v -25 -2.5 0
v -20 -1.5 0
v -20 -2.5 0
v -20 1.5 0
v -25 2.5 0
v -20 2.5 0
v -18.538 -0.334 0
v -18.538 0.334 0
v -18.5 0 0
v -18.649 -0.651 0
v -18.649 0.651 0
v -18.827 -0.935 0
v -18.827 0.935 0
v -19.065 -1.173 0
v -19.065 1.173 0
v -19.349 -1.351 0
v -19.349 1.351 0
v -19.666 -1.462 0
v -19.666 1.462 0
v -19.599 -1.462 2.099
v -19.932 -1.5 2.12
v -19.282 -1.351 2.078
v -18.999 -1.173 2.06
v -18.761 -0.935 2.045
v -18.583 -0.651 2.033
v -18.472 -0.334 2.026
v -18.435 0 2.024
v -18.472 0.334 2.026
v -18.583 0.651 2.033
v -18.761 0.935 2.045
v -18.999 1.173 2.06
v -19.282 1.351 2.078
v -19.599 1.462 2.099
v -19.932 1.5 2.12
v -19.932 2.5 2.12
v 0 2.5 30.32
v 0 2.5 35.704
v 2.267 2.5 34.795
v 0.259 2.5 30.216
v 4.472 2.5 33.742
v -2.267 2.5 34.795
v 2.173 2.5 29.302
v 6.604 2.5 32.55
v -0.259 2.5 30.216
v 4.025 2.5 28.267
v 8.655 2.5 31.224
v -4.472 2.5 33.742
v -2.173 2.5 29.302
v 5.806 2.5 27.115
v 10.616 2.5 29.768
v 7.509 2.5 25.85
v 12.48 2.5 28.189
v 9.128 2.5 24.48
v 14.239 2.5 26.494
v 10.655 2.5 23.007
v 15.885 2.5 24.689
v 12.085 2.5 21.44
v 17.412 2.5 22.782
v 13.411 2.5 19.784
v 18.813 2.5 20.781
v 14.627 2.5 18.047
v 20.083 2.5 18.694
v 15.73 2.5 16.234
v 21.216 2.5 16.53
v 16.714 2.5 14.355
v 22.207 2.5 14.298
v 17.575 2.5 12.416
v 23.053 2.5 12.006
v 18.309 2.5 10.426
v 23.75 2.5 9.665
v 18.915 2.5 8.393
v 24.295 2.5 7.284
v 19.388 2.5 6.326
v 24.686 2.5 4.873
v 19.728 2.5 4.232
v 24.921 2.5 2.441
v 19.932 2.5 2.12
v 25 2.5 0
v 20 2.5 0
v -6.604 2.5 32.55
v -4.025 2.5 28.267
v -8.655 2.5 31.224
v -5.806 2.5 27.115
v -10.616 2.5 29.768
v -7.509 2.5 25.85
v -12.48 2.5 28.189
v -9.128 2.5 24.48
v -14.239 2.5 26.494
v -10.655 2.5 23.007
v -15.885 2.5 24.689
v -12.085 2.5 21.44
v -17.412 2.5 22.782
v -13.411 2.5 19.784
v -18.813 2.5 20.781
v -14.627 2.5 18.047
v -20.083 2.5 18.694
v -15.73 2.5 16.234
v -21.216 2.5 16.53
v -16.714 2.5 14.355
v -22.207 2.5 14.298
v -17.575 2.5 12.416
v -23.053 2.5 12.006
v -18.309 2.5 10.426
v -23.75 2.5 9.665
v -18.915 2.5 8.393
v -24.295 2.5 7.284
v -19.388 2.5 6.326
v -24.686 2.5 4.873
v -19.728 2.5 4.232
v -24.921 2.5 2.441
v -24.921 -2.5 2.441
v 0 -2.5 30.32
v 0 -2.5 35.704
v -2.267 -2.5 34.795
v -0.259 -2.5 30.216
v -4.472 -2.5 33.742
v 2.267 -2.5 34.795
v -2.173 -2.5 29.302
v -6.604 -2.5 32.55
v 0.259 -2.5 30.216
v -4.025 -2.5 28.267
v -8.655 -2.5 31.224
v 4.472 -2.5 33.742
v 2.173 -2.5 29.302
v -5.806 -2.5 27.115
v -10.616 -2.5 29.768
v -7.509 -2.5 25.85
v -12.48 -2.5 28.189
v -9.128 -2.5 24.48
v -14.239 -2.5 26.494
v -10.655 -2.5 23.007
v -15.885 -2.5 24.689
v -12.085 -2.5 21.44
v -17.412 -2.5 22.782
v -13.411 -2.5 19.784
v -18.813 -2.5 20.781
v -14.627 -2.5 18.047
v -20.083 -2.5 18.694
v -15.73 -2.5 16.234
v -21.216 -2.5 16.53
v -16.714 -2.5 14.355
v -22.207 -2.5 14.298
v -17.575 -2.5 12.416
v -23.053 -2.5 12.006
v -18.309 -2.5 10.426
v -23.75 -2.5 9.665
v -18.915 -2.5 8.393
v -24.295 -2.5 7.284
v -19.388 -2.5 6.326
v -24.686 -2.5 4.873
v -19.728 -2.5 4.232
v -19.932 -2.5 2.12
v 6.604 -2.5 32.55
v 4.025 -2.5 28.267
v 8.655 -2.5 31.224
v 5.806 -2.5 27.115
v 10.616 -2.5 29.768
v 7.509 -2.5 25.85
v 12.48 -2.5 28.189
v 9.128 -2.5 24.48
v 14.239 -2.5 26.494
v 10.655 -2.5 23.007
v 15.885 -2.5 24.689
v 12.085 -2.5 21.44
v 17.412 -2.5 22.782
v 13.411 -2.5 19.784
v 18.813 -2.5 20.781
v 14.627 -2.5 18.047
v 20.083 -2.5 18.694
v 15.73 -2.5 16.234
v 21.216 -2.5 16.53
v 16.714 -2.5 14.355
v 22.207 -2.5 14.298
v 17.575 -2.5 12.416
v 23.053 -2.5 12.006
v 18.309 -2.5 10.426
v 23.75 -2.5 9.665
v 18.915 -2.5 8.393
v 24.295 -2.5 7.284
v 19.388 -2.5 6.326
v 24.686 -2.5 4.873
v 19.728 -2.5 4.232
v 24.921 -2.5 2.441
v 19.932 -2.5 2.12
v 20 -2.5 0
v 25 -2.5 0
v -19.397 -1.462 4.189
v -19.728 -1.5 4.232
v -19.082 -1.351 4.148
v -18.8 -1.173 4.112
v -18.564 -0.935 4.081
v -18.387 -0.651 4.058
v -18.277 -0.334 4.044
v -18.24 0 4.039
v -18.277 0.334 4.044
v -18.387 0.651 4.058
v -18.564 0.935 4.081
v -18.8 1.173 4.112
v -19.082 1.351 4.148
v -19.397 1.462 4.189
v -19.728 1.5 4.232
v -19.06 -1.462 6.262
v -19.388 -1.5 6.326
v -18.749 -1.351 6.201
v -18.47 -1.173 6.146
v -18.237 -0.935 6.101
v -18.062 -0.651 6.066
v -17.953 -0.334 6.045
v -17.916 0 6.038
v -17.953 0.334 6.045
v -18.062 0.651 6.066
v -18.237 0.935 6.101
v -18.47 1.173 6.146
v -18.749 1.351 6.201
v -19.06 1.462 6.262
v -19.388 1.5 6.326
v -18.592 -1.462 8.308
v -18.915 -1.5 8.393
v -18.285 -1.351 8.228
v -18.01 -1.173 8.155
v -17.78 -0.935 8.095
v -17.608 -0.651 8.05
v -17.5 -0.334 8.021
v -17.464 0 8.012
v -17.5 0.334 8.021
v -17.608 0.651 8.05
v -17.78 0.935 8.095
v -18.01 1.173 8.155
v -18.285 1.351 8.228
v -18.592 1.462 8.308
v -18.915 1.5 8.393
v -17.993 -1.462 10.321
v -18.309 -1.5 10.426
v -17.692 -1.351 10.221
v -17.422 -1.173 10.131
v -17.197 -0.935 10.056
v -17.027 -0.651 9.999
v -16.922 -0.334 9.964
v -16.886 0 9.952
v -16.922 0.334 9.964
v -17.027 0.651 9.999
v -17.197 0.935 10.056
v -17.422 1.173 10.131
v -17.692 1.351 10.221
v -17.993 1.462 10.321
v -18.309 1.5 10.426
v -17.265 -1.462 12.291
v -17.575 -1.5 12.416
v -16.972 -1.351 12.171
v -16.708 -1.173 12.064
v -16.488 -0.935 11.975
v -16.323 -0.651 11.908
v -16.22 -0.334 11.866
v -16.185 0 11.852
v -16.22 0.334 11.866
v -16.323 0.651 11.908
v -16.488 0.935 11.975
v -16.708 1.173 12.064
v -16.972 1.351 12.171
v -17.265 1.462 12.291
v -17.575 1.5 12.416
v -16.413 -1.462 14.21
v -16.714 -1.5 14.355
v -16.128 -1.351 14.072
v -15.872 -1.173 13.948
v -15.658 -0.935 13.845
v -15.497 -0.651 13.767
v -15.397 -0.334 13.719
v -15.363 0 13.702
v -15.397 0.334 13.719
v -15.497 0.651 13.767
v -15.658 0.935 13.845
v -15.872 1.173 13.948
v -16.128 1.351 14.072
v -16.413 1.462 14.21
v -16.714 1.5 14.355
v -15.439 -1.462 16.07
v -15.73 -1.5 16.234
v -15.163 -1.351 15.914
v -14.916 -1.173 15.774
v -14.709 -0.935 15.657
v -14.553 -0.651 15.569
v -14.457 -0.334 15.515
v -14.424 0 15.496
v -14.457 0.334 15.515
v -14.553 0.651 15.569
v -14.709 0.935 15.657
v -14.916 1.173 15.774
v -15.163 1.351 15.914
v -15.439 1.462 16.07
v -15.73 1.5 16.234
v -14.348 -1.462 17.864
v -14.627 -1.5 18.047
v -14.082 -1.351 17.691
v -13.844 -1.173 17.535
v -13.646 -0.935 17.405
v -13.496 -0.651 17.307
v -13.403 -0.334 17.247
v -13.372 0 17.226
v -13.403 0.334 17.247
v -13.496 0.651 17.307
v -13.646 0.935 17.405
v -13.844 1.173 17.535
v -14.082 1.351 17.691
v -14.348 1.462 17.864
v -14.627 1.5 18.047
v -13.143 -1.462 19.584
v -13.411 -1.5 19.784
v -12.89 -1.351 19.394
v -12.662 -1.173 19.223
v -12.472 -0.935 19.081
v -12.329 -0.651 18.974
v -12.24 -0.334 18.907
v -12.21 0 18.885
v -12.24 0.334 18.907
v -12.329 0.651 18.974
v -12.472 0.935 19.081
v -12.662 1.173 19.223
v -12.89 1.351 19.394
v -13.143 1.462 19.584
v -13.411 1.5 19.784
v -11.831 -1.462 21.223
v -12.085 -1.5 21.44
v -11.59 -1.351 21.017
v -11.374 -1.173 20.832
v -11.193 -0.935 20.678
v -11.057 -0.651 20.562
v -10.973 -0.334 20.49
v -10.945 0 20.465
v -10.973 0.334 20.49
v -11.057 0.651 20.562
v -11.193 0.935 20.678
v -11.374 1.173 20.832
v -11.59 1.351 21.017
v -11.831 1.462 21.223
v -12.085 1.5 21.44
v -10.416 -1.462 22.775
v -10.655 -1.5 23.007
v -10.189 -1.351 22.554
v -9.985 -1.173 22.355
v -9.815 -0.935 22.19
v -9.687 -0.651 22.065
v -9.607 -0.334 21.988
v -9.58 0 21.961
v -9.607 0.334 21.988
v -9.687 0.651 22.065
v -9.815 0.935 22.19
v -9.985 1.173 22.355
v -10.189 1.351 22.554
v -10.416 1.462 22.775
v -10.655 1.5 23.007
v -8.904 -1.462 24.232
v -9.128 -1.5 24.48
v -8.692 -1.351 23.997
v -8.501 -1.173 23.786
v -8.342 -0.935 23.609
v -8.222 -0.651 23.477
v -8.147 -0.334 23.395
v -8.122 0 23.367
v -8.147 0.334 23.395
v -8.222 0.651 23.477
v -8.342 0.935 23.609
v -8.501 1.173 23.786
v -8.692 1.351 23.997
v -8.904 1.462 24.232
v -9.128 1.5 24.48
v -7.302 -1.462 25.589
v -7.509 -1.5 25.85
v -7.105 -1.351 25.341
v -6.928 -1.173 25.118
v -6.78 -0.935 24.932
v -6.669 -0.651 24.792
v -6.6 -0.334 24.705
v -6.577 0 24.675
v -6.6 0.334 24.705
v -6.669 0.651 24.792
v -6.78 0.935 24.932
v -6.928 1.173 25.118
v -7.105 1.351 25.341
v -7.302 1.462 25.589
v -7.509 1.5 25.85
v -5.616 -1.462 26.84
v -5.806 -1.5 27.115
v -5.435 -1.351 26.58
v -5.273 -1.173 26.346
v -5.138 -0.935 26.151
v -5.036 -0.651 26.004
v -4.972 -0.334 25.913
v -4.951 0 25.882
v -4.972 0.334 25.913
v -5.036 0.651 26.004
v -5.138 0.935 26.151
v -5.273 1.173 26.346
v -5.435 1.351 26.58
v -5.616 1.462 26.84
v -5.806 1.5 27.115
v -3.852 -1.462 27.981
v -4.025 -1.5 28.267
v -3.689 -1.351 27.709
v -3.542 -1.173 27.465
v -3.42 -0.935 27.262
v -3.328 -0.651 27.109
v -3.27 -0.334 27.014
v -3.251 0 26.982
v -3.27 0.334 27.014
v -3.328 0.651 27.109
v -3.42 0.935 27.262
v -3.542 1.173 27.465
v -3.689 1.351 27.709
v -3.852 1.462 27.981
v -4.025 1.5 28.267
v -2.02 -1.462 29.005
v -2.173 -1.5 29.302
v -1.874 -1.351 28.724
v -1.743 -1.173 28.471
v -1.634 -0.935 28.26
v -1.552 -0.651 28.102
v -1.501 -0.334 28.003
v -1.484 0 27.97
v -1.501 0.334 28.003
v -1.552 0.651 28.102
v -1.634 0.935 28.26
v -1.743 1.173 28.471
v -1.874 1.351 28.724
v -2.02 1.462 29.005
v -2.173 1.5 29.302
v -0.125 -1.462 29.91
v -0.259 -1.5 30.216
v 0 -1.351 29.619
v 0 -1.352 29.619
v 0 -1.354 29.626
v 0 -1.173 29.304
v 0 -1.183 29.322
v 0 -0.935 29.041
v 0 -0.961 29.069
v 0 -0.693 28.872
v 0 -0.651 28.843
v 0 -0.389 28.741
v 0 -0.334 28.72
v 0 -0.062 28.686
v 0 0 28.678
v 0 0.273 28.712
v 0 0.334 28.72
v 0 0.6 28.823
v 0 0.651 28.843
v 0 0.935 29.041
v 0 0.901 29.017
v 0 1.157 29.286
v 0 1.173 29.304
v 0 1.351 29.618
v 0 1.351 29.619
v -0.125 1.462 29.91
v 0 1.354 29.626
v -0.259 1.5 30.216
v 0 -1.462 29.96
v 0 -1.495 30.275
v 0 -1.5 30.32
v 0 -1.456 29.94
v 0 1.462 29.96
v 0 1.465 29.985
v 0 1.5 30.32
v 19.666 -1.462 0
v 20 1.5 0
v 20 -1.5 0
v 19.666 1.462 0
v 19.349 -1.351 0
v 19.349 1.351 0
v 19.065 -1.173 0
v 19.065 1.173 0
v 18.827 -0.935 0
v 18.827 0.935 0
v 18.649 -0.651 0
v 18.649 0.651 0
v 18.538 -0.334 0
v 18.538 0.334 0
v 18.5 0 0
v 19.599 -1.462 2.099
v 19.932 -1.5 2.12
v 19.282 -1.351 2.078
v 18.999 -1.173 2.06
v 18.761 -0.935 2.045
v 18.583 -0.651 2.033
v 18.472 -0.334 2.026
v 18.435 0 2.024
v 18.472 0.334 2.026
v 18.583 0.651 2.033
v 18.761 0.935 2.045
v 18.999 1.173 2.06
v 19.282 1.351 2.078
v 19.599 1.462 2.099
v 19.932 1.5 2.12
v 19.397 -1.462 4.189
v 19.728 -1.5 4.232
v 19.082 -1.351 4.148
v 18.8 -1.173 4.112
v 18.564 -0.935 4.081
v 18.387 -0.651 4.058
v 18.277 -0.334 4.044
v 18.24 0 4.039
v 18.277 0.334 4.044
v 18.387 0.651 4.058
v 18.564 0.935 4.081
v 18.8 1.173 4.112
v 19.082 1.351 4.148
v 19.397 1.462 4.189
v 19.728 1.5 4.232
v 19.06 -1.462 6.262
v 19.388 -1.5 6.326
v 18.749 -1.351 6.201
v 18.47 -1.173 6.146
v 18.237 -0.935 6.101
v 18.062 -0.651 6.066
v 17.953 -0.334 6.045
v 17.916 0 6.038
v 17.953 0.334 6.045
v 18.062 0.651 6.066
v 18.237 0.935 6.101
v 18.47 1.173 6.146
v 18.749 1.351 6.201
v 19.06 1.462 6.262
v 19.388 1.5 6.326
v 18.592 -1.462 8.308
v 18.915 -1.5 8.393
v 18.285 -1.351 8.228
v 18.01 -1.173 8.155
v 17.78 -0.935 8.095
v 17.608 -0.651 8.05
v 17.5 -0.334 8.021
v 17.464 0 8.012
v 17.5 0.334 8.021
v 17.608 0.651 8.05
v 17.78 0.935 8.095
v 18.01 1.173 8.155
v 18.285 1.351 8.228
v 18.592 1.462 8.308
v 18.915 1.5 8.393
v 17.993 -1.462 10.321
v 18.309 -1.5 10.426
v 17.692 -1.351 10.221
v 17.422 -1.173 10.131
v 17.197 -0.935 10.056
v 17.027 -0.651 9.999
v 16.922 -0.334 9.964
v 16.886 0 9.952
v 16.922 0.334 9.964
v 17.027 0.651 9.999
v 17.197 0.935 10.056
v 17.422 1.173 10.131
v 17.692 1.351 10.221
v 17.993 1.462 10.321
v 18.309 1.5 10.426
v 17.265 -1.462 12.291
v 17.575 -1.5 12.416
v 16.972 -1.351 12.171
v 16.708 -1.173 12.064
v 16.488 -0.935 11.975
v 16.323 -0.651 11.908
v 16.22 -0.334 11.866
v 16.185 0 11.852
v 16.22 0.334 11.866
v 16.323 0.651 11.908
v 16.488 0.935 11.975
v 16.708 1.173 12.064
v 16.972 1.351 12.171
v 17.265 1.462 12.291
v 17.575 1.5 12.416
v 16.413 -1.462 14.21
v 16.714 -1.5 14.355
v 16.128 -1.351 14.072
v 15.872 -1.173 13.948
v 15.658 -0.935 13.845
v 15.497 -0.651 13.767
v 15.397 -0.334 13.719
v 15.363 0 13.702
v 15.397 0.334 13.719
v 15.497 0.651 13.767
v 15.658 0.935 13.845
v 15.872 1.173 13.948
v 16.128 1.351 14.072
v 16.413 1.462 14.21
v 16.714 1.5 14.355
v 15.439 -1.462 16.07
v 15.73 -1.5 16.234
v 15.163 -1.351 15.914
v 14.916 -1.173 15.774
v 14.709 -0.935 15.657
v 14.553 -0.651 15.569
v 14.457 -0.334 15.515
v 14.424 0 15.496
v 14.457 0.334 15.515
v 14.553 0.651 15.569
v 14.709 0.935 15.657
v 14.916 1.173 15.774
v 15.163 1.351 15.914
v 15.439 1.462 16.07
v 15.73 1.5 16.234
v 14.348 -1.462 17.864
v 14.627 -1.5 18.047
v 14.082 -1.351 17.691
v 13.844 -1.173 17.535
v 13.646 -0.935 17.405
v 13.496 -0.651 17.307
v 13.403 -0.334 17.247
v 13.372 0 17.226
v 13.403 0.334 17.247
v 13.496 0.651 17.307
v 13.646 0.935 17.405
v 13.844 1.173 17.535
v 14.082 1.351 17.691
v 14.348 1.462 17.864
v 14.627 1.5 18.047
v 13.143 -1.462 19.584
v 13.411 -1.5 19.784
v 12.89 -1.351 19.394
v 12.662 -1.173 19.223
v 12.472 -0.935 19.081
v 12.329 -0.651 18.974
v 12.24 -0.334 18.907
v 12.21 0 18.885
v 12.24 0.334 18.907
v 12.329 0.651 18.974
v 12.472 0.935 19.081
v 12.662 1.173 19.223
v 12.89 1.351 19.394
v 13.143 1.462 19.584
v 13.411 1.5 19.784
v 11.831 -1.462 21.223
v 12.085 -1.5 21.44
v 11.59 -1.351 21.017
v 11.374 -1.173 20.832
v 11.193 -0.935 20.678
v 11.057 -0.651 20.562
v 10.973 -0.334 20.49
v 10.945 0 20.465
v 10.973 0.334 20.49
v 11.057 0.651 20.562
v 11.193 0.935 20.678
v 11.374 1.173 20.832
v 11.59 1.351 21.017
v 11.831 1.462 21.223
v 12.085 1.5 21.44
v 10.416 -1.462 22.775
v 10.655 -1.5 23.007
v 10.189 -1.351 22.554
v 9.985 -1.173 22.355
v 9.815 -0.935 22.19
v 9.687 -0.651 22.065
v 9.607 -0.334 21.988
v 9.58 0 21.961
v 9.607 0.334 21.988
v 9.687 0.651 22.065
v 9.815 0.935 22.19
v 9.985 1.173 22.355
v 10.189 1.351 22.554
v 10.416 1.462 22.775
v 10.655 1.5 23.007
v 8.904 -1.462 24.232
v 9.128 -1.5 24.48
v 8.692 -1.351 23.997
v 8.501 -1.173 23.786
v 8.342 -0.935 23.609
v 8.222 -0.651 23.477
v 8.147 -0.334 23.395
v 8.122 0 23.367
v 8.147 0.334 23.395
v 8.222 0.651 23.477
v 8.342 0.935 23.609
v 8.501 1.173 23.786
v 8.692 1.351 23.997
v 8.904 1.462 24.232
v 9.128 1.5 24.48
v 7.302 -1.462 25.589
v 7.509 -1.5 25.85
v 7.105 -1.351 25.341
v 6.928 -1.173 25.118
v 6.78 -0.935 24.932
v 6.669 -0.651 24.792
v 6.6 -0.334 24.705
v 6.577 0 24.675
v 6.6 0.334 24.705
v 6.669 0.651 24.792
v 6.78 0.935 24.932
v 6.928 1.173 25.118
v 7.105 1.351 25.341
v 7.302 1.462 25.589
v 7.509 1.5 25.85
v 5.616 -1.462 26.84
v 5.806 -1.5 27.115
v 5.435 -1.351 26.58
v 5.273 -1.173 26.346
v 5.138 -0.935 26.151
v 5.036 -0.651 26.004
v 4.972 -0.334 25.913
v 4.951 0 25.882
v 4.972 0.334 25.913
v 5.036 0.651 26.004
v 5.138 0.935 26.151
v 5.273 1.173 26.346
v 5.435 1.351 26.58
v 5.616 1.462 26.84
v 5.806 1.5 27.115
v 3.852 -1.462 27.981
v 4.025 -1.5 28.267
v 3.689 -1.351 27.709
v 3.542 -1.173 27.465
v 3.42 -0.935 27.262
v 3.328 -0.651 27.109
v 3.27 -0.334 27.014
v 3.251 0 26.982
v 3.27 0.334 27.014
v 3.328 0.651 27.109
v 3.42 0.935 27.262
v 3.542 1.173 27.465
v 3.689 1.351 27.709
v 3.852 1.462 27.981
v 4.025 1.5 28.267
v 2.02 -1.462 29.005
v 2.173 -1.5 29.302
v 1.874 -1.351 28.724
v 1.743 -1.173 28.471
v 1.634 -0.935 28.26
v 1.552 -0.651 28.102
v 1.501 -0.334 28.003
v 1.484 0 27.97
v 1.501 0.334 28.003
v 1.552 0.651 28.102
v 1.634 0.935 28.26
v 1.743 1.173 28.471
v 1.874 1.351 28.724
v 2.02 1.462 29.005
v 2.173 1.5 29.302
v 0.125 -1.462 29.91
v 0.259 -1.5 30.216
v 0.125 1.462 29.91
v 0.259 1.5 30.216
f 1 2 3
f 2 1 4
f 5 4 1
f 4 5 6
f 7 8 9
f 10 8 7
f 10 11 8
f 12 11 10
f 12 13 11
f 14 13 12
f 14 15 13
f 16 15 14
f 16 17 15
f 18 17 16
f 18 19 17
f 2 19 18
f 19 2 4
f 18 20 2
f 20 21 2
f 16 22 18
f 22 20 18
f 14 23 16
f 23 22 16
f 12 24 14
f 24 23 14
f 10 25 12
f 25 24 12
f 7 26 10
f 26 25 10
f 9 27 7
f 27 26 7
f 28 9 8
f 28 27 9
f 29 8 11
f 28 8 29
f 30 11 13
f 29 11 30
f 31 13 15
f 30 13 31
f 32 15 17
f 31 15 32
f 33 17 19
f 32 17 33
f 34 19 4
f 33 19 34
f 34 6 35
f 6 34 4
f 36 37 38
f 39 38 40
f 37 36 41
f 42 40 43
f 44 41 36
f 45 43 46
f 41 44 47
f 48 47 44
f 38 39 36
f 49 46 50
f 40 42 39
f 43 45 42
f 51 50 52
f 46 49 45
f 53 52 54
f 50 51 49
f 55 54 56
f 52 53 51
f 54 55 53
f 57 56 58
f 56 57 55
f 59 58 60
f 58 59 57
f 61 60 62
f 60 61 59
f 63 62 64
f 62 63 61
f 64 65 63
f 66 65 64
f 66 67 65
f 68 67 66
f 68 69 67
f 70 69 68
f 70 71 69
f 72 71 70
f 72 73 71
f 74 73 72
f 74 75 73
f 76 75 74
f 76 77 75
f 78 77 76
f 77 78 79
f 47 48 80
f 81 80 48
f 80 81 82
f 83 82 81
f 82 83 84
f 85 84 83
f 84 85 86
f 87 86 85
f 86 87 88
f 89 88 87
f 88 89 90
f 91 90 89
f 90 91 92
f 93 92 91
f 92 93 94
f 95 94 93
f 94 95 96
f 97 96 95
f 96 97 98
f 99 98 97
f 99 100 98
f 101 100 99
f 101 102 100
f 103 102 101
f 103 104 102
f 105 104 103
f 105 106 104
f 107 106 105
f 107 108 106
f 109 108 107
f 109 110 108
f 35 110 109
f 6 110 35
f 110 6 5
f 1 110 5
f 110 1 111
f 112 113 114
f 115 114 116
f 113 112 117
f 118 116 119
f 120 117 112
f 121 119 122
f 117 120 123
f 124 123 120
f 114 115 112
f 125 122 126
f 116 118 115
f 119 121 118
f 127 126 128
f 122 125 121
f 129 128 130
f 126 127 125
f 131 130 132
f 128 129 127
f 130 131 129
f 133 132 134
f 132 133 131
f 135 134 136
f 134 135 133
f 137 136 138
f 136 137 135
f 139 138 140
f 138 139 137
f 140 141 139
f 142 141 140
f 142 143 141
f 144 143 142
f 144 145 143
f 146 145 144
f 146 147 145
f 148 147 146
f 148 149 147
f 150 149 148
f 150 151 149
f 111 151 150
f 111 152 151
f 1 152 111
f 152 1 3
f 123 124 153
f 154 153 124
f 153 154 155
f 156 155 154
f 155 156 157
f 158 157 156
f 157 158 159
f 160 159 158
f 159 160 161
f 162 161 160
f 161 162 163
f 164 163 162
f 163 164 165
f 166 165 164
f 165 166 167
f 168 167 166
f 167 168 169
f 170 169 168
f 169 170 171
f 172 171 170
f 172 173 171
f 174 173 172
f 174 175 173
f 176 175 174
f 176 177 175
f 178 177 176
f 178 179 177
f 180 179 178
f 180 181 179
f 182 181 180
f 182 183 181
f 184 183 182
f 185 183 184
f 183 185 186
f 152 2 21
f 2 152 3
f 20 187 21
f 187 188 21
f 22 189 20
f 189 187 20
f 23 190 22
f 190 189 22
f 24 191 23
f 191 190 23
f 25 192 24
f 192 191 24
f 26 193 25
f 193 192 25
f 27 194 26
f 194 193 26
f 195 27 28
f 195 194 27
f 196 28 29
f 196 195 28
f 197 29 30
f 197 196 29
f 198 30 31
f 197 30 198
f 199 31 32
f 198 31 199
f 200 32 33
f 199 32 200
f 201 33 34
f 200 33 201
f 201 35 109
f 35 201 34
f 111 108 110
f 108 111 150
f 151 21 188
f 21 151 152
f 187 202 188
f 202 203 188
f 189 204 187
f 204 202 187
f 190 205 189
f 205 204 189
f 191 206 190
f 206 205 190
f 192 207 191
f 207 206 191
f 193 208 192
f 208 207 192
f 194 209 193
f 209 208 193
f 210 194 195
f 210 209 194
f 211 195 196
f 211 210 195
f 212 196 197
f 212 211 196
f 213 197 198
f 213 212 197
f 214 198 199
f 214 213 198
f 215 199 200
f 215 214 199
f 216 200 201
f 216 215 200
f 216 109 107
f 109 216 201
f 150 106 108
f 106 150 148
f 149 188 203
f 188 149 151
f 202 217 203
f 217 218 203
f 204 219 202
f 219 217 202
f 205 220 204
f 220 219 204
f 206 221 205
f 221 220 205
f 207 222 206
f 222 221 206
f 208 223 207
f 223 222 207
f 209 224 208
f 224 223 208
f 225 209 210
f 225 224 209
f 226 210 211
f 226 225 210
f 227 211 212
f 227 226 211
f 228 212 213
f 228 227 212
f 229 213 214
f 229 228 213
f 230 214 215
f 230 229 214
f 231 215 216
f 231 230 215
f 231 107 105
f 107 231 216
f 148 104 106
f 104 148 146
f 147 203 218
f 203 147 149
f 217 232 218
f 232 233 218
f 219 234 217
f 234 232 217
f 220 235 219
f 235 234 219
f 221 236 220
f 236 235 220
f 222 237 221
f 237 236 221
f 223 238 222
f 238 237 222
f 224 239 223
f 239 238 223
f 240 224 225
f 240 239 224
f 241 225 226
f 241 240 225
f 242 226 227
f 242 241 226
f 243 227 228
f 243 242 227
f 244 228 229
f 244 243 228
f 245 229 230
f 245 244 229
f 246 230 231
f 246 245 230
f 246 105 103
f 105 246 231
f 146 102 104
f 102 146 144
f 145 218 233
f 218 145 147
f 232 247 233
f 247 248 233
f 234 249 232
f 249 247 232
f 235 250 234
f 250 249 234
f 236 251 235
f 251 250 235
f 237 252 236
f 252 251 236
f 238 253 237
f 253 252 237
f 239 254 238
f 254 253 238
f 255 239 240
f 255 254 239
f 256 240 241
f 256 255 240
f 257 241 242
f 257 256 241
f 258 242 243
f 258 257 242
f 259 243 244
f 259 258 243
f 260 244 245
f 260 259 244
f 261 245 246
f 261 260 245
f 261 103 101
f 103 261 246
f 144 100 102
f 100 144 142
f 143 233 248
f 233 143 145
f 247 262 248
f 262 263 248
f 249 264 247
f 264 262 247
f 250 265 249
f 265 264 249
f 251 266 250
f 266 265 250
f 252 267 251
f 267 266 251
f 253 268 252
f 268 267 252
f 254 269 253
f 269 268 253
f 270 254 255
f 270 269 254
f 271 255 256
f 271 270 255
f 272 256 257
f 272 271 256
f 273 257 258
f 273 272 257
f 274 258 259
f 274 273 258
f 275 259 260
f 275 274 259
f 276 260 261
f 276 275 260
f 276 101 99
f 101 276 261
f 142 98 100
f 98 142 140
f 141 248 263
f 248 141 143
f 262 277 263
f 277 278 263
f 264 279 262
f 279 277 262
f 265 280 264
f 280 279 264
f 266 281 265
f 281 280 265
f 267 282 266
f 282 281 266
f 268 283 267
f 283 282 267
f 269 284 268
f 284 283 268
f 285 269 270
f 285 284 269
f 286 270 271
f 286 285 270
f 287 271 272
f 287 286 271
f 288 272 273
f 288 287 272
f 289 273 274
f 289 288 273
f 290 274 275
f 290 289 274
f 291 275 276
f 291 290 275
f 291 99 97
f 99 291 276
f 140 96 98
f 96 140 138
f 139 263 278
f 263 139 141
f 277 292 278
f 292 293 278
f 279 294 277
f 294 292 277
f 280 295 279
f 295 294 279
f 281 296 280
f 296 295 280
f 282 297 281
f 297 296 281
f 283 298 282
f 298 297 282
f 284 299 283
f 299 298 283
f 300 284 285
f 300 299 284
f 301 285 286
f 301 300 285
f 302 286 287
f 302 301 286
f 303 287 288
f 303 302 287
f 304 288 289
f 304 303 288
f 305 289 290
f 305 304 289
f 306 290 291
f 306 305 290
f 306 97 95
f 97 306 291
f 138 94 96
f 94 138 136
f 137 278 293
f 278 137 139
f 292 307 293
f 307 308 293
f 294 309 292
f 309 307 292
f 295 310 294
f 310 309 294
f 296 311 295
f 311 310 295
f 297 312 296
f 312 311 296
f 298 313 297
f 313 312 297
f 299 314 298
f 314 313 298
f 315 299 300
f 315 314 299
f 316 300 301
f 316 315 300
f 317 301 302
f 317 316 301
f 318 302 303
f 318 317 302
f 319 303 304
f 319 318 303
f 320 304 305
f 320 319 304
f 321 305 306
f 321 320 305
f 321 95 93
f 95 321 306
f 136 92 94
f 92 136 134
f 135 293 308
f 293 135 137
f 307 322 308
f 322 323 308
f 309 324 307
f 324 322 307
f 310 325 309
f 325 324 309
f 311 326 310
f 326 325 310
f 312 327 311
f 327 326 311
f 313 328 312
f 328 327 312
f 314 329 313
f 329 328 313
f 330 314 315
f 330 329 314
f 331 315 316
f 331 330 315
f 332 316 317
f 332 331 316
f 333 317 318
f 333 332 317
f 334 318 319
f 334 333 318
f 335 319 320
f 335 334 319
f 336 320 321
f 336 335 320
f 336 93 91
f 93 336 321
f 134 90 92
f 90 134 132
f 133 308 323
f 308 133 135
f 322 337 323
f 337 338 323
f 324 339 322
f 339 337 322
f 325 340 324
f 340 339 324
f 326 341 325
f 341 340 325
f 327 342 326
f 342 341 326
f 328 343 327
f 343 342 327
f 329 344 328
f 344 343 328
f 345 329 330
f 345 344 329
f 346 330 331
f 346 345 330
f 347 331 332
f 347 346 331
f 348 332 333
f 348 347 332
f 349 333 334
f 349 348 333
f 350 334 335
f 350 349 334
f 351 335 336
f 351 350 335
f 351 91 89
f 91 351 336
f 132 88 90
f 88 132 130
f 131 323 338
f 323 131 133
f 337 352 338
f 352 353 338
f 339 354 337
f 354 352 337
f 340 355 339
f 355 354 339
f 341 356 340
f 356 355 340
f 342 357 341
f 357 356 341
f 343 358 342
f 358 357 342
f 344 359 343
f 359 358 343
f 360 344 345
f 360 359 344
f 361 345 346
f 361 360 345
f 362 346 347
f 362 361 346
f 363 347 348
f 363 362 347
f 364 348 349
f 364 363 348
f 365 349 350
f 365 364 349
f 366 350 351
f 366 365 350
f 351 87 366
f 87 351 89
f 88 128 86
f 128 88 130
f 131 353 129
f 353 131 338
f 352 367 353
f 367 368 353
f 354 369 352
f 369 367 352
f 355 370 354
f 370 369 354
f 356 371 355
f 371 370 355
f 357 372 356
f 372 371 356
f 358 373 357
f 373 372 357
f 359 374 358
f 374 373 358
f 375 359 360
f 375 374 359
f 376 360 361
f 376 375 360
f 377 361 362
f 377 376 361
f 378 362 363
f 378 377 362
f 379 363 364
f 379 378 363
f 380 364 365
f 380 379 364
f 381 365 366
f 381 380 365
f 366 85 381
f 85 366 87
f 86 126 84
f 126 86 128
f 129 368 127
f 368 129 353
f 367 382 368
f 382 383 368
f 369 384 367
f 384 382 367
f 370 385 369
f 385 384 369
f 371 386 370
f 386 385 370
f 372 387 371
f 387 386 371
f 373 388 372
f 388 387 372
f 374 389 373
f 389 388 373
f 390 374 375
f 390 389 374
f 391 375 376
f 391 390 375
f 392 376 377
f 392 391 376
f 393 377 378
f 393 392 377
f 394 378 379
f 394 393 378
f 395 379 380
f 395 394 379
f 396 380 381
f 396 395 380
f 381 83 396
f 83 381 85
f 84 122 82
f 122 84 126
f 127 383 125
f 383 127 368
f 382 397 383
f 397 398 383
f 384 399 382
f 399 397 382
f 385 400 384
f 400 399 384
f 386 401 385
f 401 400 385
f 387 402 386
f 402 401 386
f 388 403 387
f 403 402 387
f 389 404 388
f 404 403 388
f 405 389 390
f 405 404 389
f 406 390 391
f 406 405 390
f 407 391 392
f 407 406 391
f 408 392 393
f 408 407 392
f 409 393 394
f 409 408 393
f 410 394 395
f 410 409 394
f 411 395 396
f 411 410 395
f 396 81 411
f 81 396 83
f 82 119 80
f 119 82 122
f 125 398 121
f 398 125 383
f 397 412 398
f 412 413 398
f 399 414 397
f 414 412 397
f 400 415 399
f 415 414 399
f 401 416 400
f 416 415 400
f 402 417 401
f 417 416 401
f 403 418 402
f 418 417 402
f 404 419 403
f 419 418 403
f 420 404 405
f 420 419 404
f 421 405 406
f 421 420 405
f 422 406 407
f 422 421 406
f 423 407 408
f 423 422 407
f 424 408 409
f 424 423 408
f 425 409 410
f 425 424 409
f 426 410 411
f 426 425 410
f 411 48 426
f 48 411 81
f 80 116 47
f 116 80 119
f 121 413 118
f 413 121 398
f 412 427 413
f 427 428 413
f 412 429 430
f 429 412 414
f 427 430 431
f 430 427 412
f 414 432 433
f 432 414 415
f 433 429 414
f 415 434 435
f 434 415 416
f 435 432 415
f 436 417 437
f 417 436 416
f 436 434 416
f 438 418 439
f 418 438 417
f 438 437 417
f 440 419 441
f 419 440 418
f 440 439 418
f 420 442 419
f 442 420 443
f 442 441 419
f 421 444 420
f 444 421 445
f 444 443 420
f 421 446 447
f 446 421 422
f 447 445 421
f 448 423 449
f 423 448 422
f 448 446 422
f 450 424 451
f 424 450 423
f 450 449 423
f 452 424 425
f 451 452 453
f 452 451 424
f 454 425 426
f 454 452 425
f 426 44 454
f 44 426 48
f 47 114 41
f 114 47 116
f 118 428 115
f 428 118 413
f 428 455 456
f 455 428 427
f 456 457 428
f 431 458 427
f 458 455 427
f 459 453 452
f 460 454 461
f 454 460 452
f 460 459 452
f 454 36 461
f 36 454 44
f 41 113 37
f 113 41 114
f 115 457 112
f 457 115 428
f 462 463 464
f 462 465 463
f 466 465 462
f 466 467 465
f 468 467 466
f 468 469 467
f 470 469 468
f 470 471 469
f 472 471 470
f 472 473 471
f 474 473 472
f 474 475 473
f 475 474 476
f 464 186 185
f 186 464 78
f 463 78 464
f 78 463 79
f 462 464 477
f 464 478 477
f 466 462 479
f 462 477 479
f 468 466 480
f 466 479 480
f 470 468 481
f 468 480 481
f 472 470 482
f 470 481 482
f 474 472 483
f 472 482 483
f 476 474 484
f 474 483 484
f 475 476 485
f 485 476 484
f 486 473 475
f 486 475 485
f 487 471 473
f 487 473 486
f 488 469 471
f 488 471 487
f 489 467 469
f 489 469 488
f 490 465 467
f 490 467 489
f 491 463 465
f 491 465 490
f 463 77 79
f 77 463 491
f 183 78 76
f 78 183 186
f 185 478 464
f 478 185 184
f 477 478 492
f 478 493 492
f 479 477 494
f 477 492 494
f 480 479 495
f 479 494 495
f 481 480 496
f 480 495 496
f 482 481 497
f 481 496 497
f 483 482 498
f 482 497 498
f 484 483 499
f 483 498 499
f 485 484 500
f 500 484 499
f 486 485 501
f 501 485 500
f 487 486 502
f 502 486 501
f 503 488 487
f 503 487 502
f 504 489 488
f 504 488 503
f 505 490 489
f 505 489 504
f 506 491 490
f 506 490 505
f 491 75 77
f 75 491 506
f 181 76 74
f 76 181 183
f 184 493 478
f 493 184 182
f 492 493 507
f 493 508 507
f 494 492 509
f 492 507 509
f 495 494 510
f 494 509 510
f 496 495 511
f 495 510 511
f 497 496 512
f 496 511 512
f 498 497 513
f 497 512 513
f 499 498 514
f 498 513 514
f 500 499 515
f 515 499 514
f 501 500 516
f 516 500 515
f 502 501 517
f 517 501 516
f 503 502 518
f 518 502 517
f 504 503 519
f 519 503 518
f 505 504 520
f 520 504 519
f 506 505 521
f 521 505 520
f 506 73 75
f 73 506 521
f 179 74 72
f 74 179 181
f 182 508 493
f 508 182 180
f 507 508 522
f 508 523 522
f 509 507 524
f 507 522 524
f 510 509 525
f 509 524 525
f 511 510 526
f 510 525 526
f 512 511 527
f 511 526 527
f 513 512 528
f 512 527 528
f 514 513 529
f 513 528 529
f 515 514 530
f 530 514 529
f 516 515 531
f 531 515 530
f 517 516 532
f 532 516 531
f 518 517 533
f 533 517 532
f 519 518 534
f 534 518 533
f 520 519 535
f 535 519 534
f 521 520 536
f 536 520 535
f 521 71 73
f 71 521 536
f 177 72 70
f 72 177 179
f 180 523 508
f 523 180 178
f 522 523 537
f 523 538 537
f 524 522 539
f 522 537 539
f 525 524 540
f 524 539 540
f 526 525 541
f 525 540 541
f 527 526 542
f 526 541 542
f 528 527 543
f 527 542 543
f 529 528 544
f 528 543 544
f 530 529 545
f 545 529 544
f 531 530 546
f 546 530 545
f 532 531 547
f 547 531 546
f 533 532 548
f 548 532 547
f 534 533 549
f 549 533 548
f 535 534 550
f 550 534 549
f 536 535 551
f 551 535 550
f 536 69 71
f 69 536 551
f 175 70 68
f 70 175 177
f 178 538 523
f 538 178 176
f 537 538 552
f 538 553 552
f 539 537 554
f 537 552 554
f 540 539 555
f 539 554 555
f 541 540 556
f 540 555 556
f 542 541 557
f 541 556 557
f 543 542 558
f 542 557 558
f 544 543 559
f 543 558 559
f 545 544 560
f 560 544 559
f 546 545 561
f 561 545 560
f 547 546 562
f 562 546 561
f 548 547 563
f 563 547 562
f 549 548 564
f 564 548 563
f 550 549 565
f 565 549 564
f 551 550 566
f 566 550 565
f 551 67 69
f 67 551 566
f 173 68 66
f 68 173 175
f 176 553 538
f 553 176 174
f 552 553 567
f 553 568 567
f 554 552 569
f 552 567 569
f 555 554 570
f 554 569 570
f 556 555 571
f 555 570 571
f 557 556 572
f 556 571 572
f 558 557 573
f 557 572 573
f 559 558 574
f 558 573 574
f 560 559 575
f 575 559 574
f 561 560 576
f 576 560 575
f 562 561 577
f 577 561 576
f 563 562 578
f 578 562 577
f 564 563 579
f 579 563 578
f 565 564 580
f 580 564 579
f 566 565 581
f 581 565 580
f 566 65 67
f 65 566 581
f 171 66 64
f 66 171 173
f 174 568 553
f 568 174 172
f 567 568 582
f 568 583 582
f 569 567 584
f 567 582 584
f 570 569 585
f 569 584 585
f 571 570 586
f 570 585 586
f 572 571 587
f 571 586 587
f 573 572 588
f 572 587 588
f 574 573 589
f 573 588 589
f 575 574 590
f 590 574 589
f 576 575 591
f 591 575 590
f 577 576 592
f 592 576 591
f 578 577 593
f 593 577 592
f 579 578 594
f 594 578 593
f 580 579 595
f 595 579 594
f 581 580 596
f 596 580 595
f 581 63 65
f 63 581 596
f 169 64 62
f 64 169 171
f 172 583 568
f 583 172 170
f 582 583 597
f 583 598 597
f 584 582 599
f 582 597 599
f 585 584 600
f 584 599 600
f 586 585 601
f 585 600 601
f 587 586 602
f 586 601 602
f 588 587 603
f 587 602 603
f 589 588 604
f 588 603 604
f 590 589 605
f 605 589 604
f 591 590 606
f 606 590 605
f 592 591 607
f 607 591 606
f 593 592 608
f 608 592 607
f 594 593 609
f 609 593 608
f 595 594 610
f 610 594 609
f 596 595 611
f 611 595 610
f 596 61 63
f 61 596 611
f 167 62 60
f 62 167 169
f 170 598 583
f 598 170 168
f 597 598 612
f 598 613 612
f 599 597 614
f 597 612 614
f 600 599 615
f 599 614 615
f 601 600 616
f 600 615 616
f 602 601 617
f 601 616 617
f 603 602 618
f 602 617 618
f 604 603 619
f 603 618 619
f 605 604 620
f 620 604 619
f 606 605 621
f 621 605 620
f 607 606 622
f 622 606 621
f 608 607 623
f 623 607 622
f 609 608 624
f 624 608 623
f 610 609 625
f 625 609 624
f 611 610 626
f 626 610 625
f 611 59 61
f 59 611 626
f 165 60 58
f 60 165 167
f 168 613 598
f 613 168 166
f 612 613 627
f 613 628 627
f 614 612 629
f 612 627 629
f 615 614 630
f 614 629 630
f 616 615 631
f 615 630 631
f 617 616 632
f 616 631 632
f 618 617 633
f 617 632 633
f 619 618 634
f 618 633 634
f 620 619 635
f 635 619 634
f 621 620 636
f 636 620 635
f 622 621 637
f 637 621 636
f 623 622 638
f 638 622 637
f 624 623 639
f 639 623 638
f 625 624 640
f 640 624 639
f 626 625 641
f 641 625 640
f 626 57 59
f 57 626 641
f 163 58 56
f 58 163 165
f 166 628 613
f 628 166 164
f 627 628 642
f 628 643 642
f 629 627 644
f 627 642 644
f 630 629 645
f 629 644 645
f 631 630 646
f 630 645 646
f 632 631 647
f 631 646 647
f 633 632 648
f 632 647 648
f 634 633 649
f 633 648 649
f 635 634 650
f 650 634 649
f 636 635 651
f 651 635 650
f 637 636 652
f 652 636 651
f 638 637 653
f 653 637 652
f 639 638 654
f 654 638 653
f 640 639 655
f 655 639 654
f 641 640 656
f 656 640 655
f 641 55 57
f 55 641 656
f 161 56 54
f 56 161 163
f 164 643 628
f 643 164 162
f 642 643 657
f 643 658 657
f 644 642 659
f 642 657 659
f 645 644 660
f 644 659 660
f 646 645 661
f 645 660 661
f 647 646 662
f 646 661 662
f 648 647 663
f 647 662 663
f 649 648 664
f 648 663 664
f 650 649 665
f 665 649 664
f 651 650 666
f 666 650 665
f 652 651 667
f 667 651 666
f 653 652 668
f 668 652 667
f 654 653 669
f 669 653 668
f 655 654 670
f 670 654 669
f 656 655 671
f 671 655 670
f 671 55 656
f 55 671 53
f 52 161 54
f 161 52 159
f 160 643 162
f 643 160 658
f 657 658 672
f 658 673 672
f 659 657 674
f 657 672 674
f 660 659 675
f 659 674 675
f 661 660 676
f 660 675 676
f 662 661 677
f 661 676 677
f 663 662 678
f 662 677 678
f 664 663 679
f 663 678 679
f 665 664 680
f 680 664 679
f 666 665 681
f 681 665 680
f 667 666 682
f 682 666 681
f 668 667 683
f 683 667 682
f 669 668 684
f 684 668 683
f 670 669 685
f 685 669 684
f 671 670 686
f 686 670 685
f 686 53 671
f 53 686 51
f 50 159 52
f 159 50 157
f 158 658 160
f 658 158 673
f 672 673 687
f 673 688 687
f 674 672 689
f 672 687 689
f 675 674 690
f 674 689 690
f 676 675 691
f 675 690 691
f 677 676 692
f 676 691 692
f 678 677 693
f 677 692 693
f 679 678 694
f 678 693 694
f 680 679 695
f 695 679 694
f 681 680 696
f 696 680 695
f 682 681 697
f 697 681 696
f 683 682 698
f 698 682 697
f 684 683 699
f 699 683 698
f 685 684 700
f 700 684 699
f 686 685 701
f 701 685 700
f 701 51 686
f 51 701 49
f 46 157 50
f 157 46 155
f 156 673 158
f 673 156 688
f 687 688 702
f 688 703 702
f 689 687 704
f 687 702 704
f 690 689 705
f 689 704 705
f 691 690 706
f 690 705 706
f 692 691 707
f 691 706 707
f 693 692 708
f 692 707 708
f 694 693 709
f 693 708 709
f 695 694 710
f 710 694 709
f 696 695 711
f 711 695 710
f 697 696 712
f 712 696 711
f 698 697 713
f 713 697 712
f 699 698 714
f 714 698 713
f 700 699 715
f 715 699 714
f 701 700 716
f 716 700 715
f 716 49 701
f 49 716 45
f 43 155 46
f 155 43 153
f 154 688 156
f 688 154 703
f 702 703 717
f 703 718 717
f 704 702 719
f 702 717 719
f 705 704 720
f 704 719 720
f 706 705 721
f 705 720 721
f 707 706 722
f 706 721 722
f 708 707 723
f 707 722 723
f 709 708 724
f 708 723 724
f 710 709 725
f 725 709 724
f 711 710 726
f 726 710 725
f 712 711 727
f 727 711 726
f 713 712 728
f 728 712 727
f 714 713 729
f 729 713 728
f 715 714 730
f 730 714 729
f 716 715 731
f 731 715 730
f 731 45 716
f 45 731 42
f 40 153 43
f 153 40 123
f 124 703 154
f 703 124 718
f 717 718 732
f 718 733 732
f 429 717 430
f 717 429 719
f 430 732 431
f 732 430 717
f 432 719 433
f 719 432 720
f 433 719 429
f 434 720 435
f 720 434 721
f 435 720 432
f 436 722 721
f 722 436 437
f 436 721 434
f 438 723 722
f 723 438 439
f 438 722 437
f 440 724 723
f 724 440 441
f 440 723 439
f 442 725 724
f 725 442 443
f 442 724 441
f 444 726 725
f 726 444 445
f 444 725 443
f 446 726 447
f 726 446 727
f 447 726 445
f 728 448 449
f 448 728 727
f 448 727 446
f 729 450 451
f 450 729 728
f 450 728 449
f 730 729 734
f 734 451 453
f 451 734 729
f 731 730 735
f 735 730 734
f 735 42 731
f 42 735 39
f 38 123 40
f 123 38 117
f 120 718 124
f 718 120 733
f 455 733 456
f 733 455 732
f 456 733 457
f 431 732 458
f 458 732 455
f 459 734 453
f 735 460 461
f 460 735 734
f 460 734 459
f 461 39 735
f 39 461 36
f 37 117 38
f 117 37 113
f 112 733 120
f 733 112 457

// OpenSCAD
arch_width  = 50;
arch_base = 5;
arch_angle = 70;
arch_radius = arch_width / (2 - 2 * cos(arch_angle) );

for (m = [0:1] )
mirror( [m, 0, 0] )
translate( [cos(arch_angle) * arch_radius, 0, 0] )
rotate( [-90, 0, 0] )
rotate_extrude( angle = arch_angle, $fn = 100)
translate( [ -arch_radius, 0 ] )
union() {
    translate( [0, -arch_base / 2] )
        square( arch_base );

    translate( [arch_base, 0])
        circle( d = arch_base * 3 / 5, $fn=28);
    }
